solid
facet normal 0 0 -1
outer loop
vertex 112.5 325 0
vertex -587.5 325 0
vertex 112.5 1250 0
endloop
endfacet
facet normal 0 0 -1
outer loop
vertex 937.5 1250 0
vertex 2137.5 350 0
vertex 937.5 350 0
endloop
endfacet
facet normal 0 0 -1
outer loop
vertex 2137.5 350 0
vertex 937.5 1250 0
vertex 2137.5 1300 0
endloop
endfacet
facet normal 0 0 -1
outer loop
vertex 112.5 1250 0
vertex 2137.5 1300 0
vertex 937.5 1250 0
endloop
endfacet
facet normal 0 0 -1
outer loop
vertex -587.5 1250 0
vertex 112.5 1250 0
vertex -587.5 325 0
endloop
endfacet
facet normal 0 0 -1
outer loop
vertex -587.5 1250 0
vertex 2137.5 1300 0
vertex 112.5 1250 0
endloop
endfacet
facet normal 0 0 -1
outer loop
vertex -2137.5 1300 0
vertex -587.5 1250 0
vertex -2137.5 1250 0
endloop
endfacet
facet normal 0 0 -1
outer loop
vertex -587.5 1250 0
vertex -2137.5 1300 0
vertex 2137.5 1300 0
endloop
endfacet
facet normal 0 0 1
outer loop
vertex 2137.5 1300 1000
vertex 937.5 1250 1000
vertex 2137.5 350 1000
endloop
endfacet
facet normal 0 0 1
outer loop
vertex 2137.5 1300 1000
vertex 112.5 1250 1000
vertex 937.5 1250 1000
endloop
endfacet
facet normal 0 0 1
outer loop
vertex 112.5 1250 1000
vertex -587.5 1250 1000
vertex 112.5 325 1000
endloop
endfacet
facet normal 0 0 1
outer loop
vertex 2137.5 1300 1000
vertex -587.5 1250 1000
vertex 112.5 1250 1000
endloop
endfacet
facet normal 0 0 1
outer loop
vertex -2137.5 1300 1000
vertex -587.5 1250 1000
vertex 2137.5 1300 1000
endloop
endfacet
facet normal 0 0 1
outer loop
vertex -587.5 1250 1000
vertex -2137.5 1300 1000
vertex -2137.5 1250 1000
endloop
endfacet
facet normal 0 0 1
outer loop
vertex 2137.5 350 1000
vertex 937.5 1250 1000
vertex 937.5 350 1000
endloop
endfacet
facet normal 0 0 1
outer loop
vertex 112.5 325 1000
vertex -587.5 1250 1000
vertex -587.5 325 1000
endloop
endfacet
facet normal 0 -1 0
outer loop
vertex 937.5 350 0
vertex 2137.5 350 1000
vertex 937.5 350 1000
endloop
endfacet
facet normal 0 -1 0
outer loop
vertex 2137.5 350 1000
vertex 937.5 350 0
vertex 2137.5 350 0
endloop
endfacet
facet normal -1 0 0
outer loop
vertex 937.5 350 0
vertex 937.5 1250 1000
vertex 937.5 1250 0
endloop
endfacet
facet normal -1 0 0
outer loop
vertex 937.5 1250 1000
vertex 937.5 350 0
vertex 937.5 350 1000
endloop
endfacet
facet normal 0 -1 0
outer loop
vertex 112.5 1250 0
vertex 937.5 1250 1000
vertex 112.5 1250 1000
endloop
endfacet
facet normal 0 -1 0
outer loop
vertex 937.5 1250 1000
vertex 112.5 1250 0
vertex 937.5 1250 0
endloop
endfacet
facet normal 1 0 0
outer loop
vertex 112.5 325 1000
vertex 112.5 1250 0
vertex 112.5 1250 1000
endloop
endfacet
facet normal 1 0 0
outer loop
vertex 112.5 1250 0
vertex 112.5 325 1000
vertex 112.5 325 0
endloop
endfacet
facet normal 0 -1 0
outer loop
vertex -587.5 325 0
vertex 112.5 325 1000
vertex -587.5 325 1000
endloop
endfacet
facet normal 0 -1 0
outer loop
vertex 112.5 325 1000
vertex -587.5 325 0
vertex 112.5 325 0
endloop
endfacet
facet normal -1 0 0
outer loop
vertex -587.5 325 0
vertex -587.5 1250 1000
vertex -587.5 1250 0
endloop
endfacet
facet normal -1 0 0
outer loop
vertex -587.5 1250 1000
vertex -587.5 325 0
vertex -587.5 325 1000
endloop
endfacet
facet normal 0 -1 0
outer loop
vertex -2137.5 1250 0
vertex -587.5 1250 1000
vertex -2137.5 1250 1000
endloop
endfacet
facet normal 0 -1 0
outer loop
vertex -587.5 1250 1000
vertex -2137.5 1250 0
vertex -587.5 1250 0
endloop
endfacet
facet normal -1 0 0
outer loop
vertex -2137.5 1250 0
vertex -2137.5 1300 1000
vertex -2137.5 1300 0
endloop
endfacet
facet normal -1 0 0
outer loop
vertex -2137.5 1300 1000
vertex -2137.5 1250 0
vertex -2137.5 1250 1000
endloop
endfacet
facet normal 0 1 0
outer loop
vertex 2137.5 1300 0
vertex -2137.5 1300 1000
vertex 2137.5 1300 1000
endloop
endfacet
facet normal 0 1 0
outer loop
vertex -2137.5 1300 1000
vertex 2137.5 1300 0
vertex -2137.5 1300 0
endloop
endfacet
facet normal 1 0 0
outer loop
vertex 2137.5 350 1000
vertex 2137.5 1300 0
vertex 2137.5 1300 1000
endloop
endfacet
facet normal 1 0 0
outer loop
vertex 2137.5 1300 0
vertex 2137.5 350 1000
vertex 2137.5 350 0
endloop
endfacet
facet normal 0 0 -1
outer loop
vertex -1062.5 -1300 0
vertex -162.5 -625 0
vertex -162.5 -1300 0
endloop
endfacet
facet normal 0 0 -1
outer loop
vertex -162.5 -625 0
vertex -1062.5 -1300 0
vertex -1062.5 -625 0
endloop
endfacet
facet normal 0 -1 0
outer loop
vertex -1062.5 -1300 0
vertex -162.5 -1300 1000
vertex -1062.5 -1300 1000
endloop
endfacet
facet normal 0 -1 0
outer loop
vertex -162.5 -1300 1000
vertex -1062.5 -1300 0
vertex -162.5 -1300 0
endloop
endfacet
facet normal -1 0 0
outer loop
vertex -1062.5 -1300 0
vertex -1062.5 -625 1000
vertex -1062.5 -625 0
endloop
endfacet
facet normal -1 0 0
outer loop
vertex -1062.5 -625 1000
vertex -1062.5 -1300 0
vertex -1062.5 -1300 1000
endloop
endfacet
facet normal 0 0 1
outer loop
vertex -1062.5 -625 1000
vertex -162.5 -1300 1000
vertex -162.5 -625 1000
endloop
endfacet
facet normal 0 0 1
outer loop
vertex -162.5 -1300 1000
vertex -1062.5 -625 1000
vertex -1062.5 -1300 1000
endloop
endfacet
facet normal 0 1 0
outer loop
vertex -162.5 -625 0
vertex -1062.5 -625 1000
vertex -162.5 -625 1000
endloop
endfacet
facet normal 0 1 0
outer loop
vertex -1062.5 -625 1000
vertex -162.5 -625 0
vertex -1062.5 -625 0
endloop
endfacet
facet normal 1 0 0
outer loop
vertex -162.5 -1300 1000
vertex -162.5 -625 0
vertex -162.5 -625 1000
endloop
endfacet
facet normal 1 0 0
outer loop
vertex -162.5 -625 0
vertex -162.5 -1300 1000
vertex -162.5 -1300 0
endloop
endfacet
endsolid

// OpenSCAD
// Module names are of the form poly_<inkscape-path-id>().  As a result,
// you can associate a polygon in this OpenSCAD program with the corresponding
// SVG element in the Inkscape document by looking for the XML element with
// the attribute id="inkscape-path-id".
// fudge value is used to ensure that subtracted solids are a tad taller
// in the z dimension than the polygon being subtracted from.  This helps
// keep the resulting .stl file manifold.
fudge = 0.1;

module poly_path3410(h)
{
  scale([25.4/90, -25.4/90, 1]) union()
  {
    linear_extrude(height=h)
      polygon([[-7573.818712,-4517.716425],[-7573.818712,-4429.133750],[-4827.755788,-4429.133750],[-2081.692863,-4429.133750],[-2081.692863,-2790.354262],[-2081.692863,-1151.574775],[-841.535412,-1151.574775],[398.622038,-1151.574775],[398.622038,-2790.354262],[398.622038,-4429.133750],[1860.236175,-4429.133750],[3321.850313,-4429.133750],[3321.850313,-2834.645600],[3321.850313,-1240.157450],[5447.834512,-1240.157450],[7573.818713,-1240.157450],[7573.818713,-2923.228275],[7573.818713,-4606.299100],[0.000000,-4606.299100],[-7573.818712,-4606.299100],[-7573.818712,-4517.716425]]);
  }
}

module poly_path3412(h)
{
  scale([25.4/90, -25.4/90, 1]) union()
  {
    linear_extrude(height=h)
      polygon([[-3764.763687,3410.432988],[-3764.763687,4606.299100],[-2170.275537,4606.299100],[-575.787387,4606.299100],[-575.787387,3410.432988],[-575.787387,2214.566875],[-2170.275537,2214.566875],[-3764.763687,2214.566875],[-3764.763687,3410.432988]]);
  }
}

module inkscape(h)
{

poly_path3410(h);
poly_path3412(h);
}

inkscape(1000);
